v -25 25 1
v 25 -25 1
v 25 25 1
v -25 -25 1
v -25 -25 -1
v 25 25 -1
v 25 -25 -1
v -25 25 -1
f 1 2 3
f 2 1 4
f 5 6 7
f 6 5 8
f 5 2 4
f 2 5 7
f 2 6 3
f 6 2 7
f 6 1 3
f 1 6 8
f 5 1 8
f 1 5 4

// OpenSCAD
/**
  * See how bed adherence is on this object.  To look for:
  *
  * - Do the corners lift?  
  * 	If so, calibrate your bed or end stops (for delta)
  *
  * - Is it uneven in thickness?
  * 	Calibrate your bed.
  */
gOneSide=50;
gThickness=2;

cube([gOneSide,gOneSide,gThickness],center=true);
